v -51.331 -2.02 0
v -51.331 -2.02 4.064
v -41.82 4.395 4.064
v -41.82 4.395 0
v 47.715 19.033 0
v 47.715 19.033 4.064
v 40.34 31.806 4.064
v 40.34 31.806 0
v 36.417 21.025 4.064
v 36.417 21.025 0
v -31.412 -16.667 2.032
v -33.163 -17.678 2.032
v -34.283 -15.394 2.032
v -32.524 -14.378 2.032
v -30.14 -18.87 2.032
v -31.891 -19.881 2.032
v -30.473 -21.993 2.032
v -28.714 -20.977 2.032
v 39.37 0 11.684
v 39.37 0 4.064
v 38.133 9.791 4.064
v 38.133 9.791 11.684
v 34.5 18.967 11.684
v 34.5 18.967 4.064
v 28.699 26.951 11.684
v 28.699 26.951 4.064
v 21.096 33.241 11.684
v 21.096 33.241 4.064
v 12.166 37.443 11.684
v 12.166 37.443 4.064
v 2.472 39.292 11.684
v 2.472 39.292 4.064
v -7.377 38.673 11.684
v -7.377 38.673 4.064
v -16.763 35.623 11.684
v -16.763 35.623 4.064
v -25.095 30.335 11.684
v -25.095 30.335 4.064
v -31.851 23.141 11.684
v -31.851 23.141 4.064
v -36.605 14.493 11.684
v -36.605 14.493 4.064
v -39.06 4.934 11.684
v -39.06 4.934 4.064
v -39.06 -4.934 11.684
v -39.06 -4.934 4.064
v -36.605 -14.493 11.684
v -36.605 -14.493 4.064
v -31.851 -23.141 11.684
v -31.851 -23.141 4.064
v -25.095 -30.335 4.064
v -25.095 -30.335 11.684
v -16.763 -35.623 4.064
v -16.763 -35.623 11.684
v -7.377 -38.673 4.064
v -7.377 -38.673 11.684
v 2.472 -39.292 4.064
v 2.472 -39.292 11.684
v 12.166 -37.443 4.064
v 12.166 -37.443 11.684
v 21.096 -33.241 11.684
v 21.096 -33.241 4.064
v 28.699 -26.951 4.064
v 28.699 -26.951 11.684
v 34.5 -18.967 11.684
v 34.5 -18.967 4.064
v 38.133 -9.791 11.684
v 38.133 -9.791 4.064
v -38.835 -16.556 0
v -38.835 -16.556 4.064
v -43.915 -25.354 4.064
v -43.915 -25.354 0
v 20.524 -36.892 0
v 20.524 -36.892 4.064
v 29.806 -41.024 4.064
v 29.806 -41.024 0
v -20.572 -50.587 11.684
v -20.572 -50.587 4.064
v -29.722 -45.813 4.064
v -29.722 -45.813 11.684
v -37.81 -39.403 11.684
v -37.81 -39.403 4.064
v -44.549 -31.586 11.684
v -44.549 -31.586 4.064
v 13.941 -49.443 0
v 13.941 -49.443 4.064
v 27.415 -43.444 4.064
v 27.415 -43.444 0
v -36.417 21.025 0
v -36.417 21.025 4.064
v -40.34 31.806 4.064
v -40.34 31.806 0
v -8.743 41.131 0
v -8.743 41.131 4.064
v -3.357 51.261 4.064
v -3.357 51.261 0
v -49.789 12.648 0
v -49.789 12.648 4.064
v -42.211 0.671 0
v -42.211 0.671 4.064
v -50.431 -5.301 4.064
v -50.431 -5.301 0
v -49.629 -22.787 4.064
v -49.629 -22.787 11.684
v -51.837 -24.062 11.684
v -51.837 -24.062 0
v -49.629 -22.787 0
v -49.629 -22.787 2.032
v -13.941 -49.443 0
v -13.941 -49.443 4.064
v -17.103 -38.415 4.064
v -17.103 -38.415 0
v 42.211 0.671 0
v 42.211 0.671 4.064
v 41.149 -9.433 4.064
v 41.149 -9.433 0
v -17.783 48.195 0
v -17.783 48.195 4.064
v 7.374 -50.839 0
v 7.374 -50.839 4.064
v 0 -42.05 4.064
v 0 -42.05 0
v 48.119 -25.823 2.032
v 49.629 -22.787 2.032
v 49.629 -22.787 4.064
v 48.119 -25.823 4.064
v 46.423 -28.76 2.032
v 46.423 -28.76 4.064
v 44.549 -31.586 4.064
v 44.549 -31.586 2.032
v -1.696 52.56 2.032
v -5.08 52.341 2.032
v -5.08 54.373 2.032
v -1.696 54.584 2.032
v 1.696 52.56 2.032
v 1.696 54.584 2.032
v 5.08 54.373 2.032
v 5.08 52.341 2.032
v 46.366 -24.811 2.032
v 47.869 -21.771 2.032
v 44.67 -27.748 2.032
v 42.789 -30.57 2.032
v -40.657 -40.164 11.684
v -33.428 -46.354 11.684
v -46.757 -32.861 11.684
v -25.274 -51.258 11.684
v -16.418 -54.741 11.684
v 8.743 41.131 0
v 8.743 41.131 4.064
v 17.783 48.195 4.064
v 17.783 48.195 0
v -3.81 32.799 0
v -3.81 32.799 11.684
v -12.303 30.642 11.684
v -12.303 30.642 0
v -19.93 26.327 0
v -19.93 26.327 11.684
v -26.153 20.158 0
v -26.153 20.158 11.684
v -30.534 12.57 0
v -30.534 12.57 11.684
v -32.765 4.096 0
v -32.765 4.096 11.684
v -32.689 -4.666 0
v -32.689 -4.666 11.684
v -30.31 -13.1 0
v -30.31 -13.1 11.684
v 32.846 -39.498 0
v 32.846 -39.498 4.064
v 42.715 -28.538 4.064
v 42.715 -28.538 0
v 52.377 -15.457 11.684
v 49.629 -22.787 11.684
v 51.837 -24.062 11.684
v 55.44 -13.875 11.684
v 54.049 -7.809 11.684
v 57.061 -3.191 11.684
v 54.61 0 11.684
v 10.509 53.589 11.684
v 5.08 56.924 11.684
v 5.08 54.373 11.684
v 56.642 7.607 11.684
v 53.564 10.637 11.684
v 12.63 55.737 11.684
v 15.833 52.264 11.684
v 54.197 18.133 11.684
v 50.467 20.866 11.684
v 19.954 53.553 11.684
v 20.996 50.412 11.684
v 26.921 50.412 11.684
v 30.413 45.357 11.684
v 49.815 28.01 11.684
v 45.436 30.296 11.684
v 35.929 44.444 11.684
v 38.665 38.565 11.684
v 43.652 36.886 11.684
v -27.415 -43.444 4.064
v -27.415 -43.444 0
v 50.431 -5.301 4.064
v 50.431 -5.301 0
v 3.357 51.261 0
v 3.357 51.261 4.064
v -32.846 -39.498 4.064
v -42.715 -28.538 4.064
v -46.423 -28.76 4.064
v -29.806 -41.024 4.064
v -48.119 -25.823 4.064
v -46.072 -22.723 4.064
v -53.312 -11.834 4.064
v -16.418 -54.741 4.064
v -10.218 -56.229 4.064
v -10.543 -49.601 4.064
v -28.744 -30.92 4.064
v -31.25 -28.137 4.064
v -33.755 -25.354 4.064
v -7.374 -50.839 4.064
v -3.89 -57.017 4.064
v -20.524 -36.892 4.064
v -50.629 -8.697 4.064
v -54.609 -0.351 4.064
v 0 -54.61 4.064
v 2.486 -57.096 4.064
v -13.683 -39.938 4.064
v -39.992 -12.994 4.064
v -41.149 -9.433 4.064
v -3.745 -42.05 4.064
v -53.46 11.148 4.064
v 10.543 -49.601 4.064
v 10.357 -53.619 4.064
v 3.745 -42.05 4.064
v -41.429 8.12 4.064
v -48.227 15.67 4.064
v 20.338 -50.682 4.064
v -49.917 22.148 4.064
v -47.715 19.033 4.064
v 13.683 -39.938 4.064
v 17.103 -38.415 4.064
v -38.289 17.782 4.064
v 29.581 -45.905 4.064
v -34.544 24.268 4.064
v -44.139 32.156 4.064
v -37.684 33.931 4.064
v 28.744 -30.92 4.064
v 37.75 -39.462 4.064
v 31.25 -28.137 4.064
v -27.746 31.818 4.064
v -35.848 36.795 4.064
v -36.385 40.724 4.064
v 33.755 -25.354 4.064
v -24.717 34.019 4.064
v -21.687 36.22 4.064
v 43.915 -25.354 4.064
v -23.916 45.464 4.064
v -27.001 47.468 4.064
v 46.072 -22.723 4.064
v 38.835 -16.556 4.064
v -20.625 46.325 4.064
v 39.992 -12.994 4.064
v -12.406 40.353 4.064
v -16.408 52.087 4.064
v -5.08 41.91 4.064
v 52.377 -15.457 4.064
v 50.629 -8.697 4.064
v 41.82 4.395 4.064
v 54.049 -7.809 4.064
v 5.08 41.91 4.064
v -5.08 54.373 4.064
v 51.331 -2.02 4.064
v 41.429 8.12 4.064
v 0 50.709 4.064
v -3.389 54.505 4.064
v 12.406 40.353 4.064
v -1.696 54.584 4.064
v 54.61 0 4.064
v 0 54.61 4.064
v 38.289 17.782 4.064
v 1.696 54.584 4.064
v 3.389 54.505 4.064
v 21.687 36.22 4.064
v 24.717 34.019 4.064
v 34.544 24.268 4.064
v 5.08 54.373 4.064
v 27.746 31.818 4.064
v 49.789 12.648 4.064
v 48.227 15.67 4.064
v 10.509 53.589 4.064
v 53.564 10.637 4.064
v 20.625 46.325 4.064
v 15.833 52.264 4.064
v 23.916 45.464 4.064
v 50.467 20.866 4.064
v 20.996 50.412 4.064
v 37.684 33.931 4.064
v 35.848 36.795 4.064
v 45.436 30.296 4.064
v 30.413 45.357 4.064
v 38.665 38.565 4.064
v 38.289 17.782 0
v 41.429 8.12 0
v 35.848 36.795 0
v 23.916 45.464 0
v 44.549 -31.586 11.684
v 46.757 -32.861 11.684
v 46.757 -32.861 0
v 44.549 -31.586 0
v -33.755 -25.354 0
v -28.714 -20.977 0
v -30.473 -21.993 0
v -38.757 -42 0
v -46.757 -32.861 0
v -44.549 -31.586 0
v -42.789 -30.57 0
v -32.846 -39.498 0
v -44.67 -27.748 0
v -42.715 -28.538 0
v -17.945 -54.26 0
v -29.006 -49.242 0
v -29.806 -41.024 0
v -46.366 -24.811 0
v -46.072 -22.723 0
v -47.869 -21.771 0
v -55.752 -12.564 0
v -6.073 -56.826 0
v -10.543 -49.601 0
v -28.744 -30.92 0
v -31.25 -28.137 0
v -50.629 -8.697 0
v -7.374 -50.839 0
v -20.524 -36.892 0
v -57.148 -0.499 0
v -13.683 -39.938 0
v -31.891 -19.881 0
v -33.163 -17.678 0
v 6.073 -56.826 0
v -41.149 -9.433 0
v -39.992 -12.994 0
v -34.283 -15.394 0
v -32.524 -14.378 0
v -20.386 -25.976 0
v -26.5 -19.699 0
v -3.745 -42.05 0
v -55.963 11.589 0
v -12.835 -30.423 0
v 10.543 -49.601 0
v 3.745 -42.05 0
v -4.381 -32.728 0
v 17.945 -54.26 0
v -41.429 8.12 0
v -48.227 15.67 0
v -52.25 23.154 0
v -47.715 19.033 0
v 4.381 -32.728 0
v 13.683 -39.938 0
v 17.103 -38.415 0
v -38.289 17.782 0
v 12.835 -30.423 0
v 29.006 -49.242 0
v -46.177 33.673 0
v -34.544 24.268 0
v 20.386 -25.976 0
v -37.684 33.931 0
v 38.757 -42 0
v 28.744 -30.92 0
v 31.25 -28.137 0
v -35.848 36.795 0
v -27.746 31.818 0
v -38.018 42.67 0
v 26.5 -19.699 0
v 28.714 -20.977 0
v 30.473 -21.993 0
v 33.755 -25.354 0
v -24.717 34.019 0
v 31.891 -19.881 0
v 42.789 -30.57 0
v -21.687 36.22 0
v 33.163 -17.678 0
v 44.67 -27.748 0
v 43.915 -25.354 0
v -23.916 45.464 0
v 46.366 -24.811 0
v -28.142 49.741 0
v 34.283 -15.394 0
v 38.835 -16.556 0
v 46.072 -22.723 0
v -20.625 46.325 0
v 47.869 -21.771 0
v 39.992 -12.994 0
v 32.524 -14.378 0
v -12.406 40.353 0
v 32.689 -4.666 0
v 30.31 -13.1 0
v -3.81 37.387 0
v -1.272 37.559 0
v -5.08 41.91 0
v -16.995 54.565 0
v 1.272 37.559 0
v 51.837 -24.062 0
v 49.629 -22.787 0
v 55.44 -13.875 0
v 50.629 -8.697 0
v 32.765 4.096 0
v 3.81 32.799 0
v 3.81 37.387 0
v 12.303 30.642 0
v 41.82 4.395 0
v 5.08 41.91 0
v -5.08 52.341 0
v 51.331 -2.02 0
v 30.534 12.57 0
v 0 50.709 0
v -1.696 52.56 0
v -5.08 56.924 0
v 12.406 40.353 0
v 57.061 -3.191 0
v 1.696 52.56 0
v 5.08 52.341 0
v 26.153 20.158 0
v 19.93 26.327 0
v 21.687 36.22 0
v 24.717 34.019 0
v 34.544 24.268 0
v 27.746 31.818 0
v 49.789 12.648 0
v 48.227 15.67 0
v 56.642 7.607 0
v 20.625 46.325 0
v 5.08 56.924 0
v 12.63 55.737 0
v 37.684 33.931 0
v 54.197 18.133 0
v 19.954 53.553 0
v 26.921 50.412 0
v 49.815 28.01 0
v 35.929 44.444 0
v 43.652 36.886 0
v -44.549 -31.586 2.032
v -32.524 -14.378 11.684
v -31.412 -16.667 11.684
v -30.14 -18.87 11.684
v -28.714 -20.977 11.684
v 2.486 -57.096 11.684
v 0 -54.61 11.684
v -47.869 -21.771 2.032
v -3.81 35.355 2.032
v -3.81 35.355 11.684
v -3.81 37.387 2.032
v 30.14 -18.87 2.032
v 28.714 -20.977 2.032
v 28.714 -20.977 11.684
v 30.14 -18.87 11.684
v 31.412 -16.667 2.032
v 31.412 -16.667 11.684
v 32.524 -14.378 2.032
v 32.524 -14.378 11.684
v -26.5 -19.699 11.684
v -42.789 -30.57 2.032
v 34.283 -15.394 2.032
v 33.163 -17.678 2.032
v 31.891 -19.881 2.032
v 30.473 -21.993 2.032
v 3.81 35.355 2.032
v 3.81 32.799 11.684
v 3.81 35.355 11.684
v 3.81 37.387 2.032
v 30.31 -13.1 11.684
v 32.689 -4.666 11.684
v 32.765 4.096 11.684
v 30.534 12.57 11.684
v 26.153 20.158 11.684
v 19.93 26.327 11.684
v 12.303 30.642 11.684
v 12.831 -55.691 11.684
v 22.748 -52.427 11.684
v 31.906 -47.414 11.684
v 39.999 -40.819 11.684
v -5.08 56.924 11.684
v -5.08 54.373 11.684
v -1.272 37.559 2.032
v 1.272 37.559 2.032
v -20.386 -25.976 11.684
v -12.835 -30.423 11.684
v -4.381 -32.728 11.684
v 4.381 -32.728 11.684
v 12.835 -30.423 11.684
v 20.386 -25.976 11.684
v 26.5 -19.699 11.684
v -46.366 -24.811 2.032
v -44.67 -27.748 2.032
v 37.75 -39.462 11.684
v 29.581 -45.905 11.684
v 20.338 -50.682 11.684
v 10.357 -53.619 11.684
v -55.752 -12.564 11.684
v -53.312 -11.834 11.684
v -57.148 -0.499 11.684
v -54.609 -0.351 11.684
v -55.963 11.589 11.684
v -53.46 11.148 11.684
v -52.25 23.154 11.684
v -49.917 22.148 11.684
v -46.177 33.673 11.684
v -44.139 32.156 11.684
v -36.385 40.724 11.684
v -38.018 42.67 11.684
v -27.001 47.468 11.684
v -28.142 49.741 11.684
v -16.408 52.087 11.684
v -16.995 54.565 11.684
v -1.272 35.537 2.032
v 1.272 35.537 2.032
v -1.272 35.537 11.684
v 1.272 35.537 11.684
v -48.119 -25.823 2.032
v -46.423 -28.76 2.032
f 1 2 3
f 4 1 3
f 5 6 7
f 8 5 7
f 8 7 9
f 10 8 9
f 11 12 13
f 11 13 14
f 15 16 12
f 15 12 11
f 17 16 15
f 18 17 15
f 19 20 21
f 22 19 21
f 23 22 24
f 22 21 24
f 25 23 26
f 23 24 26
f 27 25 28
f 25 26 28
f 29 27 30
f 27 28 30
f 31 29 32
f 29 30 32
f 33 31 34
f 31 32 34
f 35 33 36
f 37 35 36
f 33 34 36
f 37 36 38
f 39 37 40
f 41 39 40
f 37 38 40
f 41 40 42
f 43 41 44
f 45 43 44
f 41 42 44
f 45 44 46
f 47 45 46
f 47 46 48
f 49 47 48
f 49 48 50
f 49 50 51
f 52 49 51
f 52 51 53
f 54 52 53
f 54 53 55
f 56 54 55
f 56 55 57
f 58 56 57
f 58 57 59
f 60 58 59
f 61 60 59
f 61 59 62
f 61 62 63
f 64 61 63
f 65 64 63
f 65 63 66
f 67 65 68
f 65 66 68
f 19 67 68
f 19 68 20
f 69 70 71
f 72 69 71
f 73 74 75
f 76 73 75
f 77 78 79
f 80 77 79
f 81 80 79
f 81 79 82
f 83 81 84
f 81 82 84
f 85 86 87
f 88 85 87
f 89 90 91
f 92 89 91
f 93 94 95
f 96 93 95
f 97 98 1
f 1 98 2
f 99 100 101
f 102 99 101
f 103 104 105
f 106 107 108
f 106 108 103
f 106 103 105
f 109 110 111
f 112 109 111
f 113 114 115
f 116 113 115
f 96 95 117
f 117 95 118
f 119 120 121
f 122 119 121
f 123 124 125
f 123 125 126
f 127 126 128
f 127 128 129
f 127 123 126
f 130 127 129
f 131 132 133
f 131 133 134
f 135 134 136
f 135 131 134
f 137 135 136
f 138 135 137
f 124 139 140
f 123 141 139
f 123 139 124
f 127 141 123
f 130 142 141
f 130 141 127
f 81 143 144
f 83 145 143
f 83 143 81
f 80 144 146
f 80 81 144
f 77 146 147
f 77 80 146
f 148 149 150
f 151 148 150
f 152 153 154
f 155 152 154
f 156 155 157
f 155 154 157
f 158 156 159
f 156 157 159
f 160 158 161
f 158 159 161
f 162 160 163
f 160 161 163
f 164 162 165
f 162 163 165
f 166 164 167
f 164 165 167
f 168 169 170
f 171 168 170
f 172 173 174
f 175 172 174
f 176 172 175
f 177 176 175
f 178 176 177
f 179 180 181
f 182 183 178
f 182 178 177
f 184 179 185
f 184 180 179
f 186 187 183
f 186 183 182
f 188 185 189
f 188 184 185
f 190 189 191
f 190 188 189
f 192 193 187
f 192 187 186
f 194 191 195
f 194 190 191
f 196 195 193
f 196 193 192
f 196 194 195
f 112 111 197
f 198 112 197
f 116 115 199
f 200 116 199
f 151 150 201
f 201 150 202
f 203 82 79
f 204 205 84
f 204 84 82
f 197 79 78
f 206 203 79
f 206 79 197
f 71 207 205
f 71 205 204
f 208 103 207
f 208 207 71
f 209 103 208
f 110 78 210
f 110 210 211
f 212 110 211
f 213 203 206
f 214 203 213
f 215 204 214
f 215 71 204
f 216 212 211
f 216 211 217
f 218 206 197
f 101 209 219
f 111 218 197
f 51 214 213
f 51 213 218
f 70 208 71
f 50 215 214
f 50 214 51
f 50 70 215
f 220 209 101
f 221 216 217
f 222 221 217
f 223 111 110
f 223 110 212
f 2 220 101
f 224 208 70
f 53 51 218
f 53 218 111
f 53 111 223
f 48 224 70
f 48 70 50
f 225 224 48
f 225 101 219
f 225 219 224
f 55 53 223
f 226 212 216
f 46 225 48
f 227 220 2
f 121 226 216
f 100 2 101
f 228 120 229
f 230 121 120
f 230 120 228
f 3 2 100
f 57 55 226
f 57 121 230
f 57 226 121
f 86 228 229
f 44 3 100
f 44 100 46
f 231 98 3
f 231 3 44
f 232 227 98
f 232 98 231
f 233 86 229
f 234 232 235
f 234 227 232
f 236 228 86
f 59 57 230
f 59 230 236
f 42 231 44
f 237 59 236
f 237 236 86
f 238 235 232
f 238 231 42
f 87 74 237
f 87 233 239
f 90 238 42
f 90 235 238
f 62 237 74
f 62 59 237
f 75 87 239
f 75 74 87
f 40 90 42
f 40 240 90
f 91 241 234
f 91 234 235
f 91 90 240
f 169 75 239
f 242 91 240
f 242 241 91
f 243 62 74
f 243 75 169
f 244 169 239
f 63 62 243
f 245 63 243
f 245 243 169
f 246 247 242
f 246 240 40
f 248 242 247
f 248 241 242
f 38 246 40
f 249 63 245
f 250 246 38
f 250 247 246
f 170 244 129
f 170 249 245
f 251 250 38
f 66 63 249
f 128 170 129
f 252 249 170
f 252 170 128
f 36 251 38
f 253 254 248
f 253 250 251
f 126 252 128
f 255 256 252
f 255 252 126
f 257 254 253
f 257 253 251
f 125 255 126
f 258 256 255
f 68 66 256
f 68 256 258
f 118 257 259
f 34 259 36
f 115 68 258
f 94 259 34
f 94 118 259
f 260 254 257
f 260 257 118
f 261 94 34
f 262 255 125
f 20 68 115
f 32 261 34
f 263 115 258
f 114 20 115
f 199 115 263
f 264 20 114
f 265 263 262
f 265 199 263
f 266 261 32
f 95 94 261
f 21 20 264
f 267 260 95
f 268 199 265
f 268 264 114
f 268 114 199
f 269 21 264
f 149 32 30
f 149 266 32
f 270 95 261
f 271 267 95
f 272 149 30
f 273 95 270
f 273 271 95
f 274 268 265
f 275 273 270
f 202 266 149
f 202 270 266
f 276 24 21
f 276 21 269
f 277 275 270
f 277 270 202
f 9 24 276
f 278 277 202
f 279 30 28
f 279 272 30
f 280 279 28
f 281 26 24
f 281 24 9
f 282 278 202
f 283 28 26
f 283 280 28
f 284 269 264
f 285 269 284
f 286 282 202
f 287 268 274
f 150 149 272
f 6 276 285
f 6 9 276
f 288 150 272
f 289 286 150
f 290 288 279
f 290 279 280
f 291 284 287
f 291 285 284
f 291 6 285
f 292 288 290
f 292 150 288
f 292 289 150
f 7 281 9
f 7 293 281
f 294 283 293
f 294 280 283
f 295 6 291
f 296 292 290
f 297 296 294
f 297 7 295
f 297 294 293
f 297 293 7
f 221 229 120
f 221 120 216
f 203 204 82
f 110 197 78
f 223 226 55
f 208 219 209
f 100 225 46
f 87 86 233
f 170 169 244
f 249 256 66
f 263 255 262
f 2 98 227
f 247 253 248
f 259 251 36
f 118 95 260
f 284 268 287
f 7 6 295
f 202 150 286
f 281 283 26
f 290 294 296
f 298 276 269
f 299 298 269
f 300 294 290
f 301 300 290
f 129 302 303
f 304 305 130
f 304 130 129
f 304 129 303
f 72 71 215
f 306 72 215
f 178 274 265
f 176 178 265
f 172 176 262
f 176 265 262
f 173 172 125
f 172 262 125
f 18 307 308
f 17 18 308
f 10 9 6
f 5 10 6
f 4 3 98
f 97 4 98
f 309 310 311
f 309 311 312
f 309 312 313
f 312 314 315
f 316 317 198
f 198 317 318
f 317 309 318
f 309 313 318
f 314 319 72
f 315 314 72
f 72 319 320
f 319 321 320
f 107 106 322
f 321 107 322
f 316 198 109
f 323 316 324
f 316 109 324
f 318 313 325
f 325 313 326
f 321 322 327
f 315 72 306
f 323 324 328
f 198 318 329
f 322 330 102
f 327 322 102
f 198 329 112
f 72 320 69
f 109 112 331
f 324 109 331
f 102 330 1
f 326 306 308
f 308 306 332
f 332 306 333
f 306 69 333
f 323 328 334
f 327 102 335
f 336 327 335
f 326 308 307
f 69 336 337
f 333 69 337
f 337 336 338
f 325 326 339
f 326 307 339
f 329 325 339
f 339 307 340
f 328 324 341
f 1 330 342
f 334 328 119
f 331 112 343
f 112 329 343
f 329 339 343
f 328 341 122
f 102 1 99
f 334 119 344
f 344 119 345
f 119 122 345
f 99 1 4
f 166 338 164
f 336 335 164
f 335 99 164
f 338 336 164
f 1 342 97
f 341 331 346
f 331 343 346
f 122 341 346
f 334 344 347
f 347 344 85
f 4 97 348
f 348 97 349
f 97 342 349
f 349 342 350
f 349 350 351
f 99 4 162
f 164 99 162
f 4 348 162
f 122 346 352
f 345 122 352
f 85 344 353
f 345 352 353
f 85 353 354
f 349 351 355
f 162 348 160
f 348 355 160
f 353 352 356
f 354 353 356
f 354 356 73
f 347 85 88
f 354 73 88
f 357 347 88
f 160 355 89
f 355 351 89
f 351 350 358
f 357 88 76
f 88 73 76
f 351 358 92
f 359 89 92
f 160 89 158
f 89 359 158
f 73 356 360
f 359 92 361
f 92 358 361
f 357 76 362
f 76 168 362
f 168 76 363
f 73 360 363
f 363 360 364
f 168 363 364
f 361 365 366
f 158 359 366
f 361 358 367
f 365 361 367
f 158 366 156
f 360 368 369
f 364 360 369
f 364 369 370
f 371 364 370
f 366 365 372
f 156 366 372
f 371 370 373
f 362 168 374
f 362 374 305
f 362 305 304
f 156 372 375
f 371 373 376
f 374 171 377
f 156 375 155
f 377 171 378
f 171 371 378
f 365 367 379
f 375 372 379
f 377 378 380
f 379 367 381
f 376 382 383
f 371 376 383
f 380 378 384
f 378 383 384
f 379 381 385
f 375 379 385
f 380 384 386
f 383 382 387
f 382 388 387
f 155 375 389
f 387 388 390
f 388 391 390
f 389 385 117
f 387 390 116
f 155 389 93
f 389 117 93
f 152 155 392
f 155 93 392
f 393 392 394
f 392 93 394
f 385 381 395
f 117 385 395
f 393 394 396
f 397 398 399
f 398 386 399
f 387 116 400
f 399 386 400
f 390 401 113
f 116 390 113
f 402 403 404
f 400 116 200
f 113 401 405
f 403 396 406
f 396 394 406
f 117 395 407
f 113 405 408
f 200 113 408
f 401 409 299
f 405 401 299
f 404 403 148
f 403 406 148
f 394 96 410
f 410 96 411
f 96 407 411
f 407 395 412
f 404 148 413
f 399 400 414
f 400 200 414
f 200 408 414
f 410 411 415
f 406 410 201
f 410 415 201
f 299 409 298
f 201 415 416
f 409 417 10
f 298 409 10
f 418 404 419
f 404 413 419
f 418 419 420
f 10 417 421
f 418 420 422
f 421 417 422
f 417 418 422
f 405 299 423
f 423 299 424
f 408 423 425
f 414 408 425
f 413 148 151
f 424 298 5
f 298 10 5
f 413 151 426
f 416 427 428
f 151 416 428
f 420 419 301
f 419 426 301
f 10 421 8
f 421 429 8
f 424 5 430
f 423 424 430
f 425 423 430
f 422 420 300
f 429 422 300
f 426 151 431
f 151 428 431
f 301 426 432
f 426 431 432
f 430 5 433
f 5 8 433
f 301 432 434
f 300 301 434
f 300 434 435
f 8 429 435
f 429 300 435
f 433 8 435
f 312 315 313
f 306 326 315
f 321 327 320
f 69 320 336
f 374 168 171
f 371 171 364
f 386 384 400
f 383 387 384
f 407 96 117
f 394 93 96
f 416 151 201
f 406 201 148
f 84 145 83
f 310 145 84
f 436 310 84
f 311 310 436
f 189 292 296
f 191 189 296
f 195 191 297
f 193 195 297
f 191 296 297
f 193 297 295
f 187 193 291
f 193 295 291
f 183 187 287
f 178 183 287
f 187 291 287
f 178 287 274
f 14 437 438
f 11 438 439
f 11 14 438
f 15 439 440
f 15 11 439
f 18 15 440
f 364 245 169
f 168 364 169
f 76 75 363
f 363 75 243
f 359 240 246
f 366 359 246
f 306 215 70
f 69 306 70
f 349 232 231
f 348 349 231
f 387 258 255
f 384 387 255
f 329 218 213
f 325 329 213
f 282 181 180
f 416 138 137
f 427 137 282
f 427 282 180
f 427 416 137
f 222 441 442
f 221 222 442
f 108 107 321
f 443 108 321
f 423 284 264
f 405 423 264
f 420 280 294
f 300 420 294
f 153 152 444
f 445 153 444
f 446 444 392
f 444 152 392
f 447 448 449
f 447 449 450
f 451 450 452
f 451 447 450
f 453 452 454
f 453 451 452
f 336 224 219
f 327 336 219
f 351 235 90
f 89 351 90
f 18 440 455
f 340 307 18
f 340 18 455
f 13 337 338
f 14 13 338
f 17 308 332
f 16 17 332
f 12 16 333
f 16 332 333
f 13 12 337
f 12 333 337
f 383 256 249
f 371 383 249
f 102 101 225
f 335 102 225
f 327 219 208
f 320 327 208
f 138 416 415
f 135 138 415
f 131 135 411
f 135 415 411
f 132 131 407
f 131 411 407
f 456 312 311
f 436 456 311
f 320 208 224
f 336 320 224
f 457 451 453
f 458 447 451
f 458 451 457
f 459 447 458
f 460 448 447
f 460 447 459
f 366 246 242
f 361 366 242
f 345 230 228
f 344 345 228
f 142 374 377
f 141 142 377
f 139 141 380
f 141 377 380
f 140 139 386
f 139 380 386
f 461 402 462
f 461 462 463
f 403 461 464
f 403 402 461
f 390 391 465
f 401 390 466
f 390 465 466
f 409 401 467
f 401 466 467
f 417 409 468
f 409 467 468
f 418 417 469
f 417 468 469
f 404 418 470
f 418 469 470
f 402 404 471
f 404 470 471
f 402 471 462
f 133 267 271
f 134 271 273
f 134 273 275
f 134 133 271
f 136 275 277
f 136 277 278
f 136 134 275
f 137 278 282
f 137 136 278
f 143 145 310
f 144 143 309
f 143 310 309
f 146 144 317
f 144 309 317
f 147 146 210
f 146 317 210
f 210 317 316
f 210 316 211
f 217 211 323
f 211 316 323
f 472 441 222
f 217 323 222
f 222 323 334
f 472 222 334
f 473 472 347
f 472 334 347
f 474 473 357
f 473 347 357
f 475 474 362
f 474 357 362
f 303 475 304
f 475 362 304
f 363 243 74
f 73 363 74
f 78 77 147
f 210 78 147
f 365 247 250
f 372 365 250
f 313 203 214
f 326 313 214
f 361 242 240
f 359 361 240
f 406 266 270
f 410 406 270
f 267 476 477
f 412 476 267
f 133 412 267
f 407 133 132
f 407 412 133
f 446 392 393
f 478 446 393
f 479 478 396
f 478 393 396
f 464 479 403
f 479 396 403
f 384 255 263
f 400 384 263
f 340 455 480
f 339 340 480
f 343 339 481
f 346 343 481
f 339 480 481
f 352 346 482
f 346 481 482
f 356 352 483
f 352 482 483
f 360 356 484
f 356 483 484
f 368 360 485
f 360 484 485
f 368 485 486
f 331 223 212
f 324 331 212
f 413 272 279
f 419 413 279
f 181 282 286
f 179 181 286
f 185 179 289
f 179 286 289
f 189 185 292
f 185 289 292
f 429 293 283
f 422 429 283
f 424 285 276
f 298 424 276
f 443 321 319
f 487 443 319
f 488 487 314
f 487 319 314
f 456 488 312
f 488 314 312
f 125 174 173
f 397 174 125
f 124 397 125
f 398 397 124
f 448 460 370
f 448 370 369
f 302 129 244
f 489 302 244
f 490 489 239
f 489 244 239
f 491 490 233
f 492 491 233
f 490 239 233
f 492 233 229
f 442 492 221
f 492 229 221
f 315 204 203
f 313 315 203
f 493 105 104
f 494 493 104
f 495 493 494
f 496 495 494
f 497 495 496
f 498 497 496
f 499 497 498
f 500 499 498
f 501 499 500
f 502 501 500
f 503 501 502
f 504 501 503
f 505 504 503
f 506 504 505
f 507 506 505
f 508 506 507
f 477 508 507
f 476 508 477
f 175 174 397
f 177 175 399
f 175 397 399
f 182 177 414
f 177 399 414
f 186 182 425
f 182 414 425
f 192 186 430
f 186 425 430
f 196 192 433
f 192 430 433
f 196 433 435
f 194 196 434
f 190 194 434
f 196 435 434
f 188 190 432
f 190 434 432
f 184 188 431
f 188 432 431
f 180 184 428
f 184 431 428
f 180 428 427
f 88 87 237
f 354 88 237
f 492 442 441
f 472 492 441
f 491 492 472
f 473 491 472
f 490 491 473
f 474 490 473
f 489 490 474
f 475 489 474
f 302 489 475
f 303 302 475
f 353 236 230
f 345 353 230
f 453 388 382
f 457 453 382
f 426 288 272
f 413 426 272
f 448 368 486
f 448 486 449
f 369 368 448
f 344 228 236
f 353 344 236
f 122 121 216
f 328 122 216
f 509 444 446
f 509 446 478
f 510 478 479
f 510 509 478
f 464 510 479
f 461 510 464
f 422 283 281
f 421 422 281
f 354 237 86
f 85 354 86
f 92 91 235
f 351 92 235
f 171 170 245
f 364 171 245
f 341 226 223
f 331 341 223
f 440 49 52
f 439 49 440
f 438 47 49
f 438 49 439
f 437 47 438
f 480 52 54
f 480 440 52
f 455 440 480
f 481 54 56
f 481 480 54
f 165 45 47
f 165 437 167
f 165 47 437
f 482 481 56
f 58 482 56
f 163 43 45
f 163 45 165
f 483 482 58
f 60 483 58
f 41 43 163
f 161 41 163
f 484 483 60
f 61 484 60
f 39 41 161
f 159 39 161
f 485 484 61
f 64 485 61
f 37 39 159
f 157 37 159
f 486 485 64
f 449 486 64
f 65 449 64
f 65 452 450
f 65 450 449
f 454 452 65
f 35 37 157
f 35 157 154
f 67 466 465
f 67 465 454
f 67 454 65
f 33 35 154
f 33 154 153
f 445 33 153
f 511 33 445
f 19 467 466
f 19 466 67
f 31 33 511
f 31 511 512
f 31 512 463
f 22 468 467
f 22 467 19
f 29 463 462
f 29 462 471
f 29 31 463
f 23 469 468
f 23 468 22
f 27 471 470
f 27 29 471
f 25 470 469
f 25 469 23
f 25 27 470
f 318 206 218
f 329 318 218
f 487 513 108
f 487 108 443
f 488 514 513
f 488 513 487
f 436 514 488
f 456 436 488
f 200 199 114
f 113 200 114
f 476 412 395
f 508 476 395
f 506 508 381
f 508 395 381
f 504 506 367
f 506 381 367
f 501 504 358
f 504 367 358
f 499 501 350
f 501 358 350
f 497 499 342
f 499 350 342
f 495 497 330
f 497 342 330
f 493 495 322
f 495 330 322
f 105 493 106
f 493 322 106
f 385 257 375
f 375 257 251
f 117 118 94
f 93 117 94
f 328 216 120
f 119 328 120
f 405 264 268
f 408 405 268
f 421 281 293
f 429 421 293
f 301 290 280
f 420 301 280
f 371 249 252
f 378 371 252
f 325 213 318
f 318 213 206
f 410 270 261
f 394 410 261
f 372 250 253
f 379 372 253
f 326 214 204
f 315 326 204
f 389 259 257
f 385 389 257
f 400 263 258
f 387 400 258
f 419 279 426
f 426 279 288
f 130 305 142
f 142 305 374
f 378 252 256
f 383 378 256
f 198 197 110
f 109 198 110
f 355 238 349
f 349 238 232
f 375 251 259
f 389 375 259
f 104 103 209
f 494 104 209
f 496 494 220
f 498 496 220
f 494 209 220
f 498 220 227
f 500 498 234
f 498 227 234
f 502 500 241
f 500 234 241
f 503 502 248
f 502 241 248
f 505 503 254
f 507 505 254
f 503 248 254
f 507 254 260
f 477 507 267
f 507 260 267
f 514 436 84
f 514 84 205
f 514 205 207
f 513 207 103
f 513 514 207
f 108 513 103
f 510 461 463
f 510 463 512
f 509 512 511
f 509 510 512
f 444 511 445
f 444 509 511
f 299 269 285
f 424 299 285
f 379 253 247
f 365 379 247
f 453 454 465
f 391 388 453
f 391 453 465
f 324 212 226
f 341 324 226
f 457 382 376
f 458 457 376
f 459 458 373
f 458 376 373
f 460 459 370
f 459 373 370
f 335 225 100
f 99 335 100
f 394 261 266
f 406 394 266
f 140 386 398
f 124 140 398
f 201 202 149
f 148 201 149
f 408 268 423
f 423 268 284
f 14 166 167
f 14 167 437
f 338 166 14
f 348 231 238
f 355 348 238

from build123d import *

# Parameters (mm, degrees)
F0_R      = 57.15
F2_DEPTH  = 4.064
F1_R      = 39.37
F1_R_2    = 33.02
F3_DEPTH  = 11.684
F5_D      = 66.04
F7_DEPTH  = 11.685
F9_DEPTH  = 2.032
F11_DEPTH = 7.62
F13_DEPTH = 4.065


with BuildPart() as f2:
    # F0 (on Top) → F2 (new body)
    with BuildSketch(Plane.XY):
        Circle(F0_R)
    extrude(amount=F2_DEPTH)

    # F1 (on Top) → F3 (join)
    with BuildSketch(Plane.XY):
        with BuildLine():
            ThreePointArc((26.9206593113, 50.4123060596), (13.8755037511, 55.4399936477), (0, 57.15))
            ThreePointArc((0, 57.15), (-40.4111525448, -40.4111525448), (57.15, 0))
            ThreePointArc((57.15, 0), (49.013458252, 29.3905326624), (26.9206593113, 50.4123060596))
        make_face()
        with BuildLine():
            ThreePointArc((54.61, 0), (-38.6151013206, -38.6151013206), (0, 54.61))
            ThreePointArc((0, 54.61), (10.7059811808, 53.550294742), (20.9964639346, 50.4123060596))
            ThreePointArc((20.9964639346, 50.4123060596), (45.4360484388, 30.2955046544), (54.61, 0))
        make_face(mode=Mode.SUBTRACT)
        Circle(F1_R)
        Circle(F1_R_2, mode=Mode.SUBTRACT)
    extrude(amount=F3_DEPTH)

    # F5 (through all)
    with Locations(Plane(origin=(0, 0, 0), x_dir=(1, 0, 0), z_dir=(0, 0, -1))):
        with Locations((0, 0)):
            Hole(F5_D / 2)

    # F6 (on Top) → F7 (cut, through all)
    with BuildSketch(Plane.XY):
        with BuildLine():
            Line((-46.757434771, -32.8612962866), (-44.5485790293, -31.5860128296))
            ThreePointArc((-44.5485790293, -31.5860128296), (-47.2936473007, -27.305), (-49.6285790293, -22.7871947271))
            Line((-49.6285790293, -22.7871947271), (-51.837434771, -24.0624781842))
            ThreePointArc((-51.837434771, -24.0624781842), (-49.4933518263, -28.575), (-46.757434771, -32.8612962866))
        make_face()
        with BuildLine():
            Line((-28.7135911662, -20.9772086404), (-26.5001619429, -19.6992846825))
            ThreePointArc((-26.5001619429, -19.6992846825), (-28.596158833, -16.51), (-30.3101619429, -13.1001711057))
            Line((-30.3101619429, -13.1001711057), (-32.5235911662, -14.3780950636))
            ThreePointArc((-32.5235911662, -14.3780950636), (-30.7958633586, -17.78), (-28.7135911662, -20.9772086404))
        make_face()
        with BuildLine():
            Line((32.5235911662, -14.3780950636), (30.3101619429, -13.1001711057))
            ThreePointArc((30.3101619429, -13.1001711057), (28.596158833, -16.51), (26.5001619429, -19.6992846825))
            Line((26.5001619429, -19.6992846825), (28.7135911662, -20.9772086404))
            ThreePointArc((28.7135911662, -20.9772086404), (30.7958633586, -17.78), (32.5235911662, -14.3780950636))
        make_face()
        with BuildLine():
            Line((51.837434771, -24.0624781842), (49.6285790293, -22.7871947271))
            ThreePointArc((49.6285790293, -22.7871947271), (47.2936473007, -27.305), (44.5485790293, -31.5860128296))
            Line((44.5485790293, -31.5860128296), (46.757434771, -32.8612962866))
            ThreePointArc((46.757434771, -32.8612962866), (49.4933518263, -28.575), (51.837434771, -24.0624781842))
        make_face()
        with BuildLine():
            Line((-3.81, 35.355303704), (-3.81, 32.7994557882))
            ThreePointArc((-3.81, 32.7994557882), (0, 33.02), (3.81, 32.7994557882))
            Line((3.81, 32.7994557882), (3.81, 35.355303704))
            ThreePointArc((3.81, 35.355303704), (0, 35.56), (-3.81, 35.355303704))
        make_face()
        with BuildLine():
            ThreePointArc((5.08, 56.9237744708), (0, 57.15), (-5.08, 56.9237744708))
            Line((-5.08, 56.9237744708), (-5.08, 54.3732075567))
            ThreePointArc((-5.08, 54.3732075567), (0, 54.61), (5.08, 54.3732075567))
            Line((5.08, 54.3732075567), (5.08, 56.9237744708))
        make_face()
    extrude(amount=F7_DEPTH, mode=Mode.SUBTRACT)

    # F8 (on face) → F9 (cut)
    with BuildSketch(Plane(origin=(0, 0, 0), x_dir=(1, 0, 0), z_dir=(0, 0, -1))):
        with BuildLine():
            ThreePointArc((3.81, -35.355303704), (0, -35.56), (-3.81, -35.355303704))
            Line((-3.81, -35.355303704), (-3.81, -37.387303704))
            ThreePointArc((-3.81, -37.387303704), (0, -37.5809337065), (3.81, -37.387303704))
            Line((3.81, -37.387303704), (3.81, -35.355303704))
        make_face()
        with BuildLine():
            Line((-5.08, -52.3412075567), (-5.08, -54.3732075567))
            ThreePointArc((-5.08, -54.3732075567), (0, -54.61), (5.08, -54.3732075567))
            Line((5.08, -54.3732075567), (5.08, -52.3412075567))
            ThreePointArc((5.08, -52.3412075567), (0, -52.5871506025), (-5.08, -52.3412075567))
        make_face()
        with BuildLine():
            Line((32.5235911662, 14.3780950636), (34.2833547866, 15.3940950636))
            ThreePointArc((34.2833547866, 15.3940950636), (32.5460432878, 18.7904668533), (30.4733547866, 21.9932086404))
            Line((30.4733547866, 21.9932086404), (28.7135911662, 20.9772086404))
            ThreePointArc((28.7135911662, 20.9772086404), (30.7958633586, 17.78), (32.5235911662, 14.3780950636))
        make_face()
        with BuildLine():
            ThreePointArc((42.7888154088, 30.5700128296), (45.5418083344, 26.2935753012), (47.8688154088, 21.7711947271))
            Line((47.8688154088, 21.7711947271), (49.6285790293, 22.7871947271))
            ThreePointArc((49.6285790293, 22.7871947271), (47.2936473007, 27.305), (44.5485790293, 31.5860128296))
            Line((44.5485790293, 31.5860128296), (42.7888154088, 30.5700128296))
        make_face()
        with BuildLine():
            Line((-28.7135911662, 20.9772086404), (-30.4733547866, 21.9932086404))
            ThreePointArc((-30.4733547866, 21.9932086404), (-32.5460432878, 18.7904668533), (-34.2833547866, 15.3940950636))
            Line((-34.2833547866, 15.3940950636), (-32.5235911662, 14.3780950636))
            ThreePointArc((-32.5235911662, 14.3780950636), (-30.7958633586, 17.78), (-28.7135911662, 20.9772086404))
        make_face()
        with BuildLine():
            ThreePointArc((-47.8688154088, 21.7711947271), (-45.5418083344, 26.2935753012), (-42.7888154088, 30.5700128296))
            Line((-42.7888154088, 30.5700128296), (-44.5485790293, 31.5860128296))
            ThreePointArc((-44.5485790293, 31.5860128296), (-47.2936473007, 27.305), (-49.6285790293, 22.7871947271))
            Line((-49.6285790293, 22.7871947271), (-47.8688154088, 21.7711947271))
        make_face()
    extrude(amount=-F9_DEPTH, mode=Mode.SUBTRACT)

    # F10 (on face) → F11 (cut)
    with BuildSketch(Plane.XY.offset(11.684)):
        with BuildLine():
            Line((2.4859084286, -57.0959084286), (0, -54.61))
            ThreePointArc((0, -54.61), (-10.4807724417, -53.59482726), (-20.571880189, -50.5870521526))
            Line((-20.571880189, -50.5870521526), (-16.4179725703, -54.7409597713))
            ThreePointArc((-16.4179725703, -54.7409597713), (-7.0648459719, -56.7116429968), (2.4859084286, -57.0959084286))
        make_face()
    extrude(amount=-F11_DEPTH, mode=Mode.SUBTRACT)

    # F12 (on face) → F13 (cut, through all)
    with BuildSketch(Plane.XY.offset(4.064)):
        Polygon((0, 50.7088181024), (-5.08, 41.91), (5.08, 41.91), align=None)
        Polygon((-21.6871436361, 36.220467983), (-12.4055217865, 40.3529122766), (-20.6251344493, 46.3248104399), align=None)
        Polygon((-34.5443831161, 24.2680879991), (-27.7460161555, 31.8184394259), (-37.6839957789, 33.9308222046), align=None)
        Polygon((-41.4285849294, 8.1195351315), (-38.2889722665, 17.782269337), (-48.22695189, 15.6698865583), align=None)
        Polygon((-41.1494080415, -9.432959124), (-42.2114172283, 0.6713833329), (-50.4310298911, -5.3005148304), align=None)
        Polygon((-33.7551246726, -25.3544090512), (-38.8351246726, -16.5555909488), (-43.9151246726, -25.3544090512), align=None)
        Polygon((-20.5242735922, -36.8918513159), (-28.743886255, -30.9199531526), (-29.8058954418, -41.0242956095), align=None)
        Polygon((-3.7445891504, -42.0503573361), (-13.6825687739, -39.9379745574), (-10.5429561111, -49.600708763), align=None)
        Polygon((13.6825687739, -39.9379745574), (3.7445891504, -42.0503573361), (10.5429561111, -49.600708763), align=None)
        Polygon((28.743886255, -30.9199531526), (20.5242735922, -36.8918513159), (29.8058954418, -41.0242956095), align=None)
        Polygon((38.8351246726, -16.5555909488), (33.7551246726, -25.3544090512), (43.9151246726, -25.3544090512), align=None)
        Polygon((42.2114172283, 0.6713833329), (41.1494080415, -9.432959124), (50.4310298911, -5.3005148304), align=None)
        Polygon((38.2889722665, 17.782269337), (41.4285849294, 8.1195351315), (48.22695189, 15.6698865583), align=None)
        Polygon((27.7460161555, 31.8184394259), (34.5443831161, 24.2680879991), (37.6839957789, 33.9308222046), align=None)
        Polygon((12.4055217865, 40.3529122766), (21.6871436361, 36.220467983), (20.6251344493, 46.3248104399), align=None)
        Polygon((7.3743431986, -50.8387573361), (0, -42.0503573361), (-7.3743431986, -50.8387573361), align=None)
        Polygon((13.9411877648, -49.4429314341), (27.4147832292, -43.4441002391), (17.103421183, -38.4149129366), align=None)
        Polygon((32.846160712, -39.4979735122), (42.714958184, -28.5375635335), (31.2495054638, -28.1371811019), align=None)
        Polygon((46.0717340741, -22.7234571422), (50.6293288156, -8.6966228373), (39.992266357, -12.9942750364), align=None)
        Polygon((51.3310860662, -2.0198485962), (49.7894285419, 12.6480429538), (41.8200010788, 4.3954592322), align=None)
        Polygon((47.7148269492, 19.0330101218), (40.3404837506, 31.8057472143), (36.4166776913, 21.0251786681), align=None)
        Polygon((35.8482407771, 36.7948884803), (23.916302837, 45.4639488353), (24.7165798958, 34.0194537045), align=None)
        Polygon((17.7831681036, 48.1945963495), (3.3567758901, 51.2610206757), (8.7427608932, 41.1314561383), align=None)
        Polygon((-3.3567758901, 51.2610206757), (-17.7831681036, 48.1945963495), (-8.7427608932, 41.1314561383), align=None)
        Polygon((-23.916302837, 45.4639488353), (-35.8482407771, 36.7948884803), (-24.7165798958, 34.0194537045), align=None)
        Polygon((-40.3404837506, 31.8057472143), (-47.7148269492, 19.0330101218), (-36.4166776913, 21.0251786681), align=None)
        Polygon((-49.7894285419, 12.6480429538), (-51.3310860662, -2.0198485962), (-41.8200010788, 4.3954592322), align=None)
        Polygon((-50.6293288156, -8.6966228373), (-46.0717340741, -22.7234571422), (-39.992266357, -12.9942750364), align=None)
        Polygon((-42.714958184, -28.5375635335), (-32.846160712, -39.4979735122), (-31.2495054638, -28.1371811019), align=None)
        Polygon((-27.4147832292, -43.4441002391), (-13.9411877648, -49.4429314341), (-17.103421183, -38.4149129366), align=None)
    extrude(amount=-F13_DEPTH, mode=Mode.SUBTRACT)


solid = f2.part
